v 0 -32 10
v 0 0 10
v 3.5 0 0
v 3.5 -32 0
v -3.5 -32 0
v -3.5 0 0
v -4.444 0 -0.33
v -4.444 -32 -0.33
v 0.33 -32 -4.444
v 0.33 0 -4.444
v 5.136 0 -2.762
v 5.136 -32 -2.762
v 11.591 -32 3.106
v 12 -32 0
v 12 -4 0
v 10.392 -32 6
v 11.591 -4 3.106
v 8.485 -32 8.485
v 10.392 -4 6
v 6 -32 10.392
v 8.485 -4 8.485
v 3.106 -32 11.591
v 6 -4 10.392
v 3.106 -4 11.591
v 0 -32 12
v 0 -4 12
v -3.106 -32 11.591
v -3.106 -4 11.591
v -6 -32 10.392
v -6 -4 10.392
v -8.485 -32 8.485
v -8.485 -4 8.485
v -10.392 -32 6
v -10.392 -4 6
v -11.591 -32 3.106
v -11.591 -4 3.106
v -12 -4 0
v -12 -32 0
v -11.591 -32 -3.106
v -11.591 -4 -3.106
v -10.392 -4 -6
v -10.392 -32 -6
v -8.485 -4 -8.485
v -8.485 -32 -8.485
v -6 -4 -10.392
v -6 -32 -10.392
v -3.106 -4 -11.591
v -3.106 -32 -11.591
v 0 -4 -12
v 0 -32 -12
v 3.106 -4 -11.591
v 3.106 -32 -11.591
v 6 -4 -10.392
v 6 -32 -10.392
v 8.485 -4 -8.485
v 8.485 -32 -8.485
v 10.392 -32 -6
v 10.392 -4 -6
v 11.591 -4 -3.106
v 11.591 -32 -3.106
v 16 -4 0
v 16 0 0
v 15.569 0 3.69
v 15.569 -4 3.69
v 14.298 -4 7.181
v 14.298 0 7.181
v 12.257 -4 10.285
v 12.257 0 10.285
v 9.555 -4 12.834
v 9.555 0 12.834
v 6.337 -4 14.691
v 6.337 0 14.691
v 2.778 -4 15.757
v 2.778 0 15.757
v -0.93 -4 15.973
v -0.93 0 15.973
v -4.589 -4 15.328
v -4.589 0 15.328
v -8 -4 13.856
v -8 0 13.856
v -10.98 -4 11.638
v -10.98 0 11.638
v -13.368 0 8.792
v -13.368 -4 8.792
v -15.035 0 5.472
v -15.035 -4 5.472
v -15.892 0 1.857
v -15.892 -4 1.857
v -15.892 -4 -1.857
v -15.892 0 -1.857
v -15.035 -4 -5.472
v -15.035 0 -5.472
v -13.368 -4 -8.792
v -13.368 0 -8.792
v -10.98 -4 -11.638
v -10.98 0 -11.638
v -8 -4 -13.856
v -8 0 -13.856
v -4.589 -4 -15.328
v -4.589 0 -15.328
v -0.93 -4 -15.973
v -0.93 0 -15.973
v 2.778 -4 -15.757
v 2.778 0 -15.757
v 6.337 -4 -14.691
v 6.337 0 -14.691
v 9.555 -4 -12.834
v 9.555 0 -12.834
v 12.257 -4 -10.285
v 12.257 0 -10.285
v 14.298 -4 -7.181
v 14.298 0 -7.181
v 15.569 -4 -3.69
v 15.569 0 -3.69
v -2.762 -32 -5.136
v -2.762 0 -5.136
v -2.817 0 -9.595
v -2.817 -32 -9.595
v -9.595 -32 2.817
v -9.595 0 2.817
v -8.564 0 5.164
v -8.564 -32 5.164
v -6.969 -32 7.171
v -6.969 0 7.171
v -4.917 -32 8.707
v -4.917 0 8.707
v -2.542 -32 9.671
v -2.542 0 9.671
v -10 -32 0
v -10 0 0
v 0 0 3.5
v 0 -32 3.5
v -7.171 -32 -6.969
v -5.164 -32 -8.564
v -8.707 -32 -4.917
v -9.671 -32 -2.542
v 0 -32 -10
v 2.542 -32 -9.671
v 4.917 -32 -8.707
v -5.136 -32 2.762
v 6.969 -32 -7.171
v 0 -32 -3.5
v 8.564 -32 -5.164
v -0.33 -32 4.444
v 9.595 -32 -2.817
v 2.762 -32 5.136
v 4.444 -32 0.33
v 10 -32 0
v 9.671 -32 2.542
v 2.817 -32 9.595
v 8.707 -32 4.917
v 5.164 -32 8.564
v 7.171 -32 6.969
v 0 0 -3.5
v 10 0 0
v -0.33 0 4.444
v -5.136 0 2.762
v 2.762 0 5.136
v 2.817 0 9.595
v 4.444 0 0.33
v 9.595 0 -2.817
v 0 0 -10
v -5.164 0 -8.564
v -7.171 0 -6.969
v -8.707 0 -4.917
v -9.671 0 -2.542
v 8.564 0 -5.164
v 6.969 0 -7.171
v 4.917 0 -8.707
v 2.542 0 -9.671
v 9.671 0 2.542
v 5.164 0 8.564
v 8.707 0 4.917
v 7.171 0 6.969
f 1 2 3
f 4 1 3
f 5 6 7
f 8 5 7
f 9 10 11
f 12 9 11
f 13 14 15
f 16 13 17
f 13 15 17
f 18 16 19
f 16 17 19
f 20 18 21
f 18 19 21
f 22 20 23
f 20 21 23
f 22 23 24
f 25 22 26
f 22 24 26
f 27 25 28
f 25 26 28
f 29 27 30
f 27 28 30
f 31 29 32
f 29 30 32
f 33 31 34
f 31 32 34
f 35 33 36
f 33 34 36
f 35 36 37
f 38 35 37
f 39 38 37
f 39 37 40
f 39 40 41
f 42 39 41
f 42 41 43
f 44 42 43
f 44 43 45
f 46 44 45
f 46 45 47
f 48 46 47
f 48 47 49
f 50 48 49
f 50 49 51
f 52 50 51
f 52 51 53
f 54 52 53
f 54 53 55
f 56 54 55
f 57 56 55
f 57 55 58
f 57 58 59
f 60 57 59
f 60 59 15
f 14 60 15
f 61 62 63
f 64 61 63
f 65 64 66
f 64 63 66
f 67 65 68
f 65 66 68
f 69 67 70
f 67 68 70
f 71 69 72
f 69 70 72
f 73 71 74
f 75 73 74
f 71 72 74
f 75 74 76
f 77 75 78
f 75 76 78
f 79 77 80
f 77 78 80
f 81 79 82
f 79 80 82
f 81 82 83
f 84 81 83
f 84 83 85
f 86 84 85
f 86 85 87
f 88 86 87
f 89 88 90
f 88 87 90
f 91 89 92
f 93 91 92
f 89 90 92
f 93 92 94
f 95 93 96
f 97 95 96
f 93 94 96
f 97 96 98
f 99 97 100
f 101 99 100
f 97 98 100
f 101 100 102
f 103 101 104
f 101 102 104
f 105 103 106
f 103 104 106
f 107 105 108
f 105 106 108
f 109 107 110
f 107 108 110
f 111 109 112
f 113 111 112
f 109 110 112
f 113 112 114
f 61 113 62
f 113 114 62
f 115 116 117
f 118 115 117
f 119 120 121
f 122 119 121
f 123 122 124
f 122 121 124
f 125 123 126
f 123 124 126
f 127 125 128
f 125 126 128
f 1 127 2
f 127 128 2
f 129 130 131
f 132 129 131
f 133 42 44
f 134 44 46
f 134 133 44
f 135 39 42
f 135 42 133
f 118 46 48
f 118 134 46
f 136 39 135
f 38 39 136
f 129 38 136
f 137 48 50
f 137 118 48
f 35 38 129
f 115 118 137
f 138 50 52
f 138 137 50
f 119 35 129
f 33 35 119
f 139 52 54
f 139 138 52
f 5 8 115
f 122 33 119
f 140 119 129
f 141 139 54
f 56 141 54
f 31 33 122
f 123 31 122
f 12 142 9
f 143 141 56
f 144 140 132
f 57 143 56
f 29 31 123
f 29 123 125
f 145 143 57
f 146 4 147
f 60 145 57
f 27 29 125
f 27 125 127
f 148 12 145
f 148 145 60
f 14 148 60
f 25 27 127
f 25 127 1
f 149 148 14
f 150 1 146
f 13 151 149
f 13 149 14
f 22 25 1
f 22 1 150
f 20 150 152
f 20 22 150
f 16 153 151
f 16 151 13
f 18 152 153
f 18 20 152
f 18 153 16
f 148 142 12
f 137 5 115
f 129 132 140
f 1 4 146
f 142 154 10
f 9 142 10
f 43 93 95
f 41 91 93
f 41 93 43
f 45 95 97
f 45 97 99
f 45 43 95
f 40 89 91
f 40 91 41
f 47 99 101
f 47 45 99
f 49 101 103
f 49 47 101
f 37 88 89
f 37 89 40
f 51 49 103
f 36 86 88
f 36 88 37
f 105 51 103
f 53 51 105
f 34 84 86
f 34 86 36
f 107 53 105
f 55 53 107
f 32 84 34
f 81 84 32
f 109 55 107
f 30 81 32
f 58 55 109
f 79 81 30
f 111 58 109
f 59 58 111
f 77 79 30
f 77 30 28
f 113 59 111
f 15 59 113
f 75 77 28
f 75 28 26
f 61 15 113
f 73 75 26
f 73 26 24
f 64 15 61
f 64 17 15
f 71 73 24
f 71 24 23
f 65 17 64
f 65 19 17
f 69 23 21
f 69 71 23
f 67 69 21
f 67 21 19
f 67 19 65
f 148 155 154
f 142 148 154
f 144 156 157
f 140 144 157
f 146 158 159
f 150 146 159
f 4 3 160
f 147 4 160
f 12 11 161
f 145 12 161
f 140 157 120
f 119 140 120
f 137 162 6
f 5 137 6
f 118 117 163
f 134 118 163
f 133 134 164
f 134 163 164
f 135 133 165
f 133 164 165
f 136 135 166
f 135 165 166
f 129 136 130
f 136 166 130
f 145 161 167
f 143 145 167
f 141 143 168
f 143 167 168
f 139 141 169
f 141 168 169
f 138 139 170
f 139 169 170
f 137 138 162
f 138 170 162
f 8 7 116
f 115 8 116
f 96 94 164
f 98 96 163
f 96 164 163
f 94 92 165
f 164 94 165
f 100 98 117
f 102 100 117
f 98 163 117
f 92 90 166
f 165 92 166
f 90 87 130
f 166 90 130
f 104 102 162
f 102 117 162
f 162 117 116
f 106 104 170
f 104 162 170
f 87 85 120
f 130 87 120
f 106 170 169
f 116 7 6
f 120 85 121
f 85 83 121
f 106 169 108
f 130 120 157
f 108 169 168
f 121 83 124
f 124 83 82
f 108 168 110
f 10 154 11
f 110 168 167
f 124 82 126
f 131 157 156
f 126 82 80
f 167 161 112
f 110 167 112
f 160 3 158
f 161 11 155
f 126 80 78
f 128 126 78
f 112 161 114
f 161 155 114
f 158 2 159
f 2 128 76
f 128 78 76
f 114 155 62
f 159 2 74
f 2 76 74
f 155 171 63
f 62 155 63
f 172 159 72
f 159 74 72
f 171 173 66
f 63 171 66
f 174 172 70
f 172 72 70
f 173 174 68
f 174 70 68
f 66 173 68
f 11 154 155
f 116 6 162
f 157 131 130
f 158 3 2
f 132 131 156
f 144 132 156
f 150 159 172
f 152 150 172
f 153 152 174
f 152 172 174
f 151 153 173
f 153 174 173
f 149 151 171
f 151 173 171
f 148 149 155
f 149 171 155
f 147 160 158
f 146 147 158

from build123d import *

# Parameters (mm, degrees)
F0_R     = 16
F0_R_2   = 12
F1_DEPTH = 4
F2_DEPTH = 32


with BuildPart() as f1:
    # F0 (on Front) → F1 (new body)
    with BuildSketch(Plane.XZ):
        Circle(F0_R)
        Circle(F0_R_2, mode=Mode.SUBTRACT)
        Circle(F0_R_2)
        with BuildLine():
            ThreePointArc((2.81716, 9.594978), (8.005361, 5.992846), (10, 0))
            ThreePointArc((10, 0), (9.985368, -0.540767), (9.941514, -1.079951))
            ThreePointArc((9.941514, -1.079951), (9.806789, -1.956244), (9.594978, -2.81716))
            ThreePointArc((9.594978, -2.81716), (5.992846, -8.005361), (0, -10))
            ThreePointArc((0, -10), (-0.540767, -9.985368), (-1.079951, -9.941514))
            ThreePointArc((-1.079951, -9.941514), (-1.956244, -9.806789), (-2.81716, -9.594978))
            ThreePointArc((-2.81716, -9.594978), (-8.005361, -5.992846), (-10, 0))
            ThreePointArc((-10, 0), (-9.985368, 0.540767), (-9.941514, 1.079951))
            ThreePointArc((-9.941514, 1.079951), (-9.806789, 1.956244), (-9.594978, 2.81716))
            ThreePointArc((-9.594978, 2.81716), (-5.992846, 8.005361), (0, 10))
            ThreePointArc((0, 10), (0.540767, 9.985368), (1.079951, 9.941514))
            ThreePointArc((1.079951, 9.941514), (1.956244, 9.806789), (2.81716, 9.594978))
        make_face(mode=Mode.SUBTRACT)
    extrude(amount=F1_DEPTH)

    # F0 (on Front) → F2 (join)
    with BuildSketch(Plane.XZ):
        Circle(F0_R_2)
        with BuildLine():
            ThreePointArc((2.81716, 9.594978), (8.005361, 5.992846), (10, 0))
            ThreePointArc((10, 0), (9.985368, -0.540767), (9.941514, -1.079951))
            ThreePointArc((9.941514, -1.079951), (9.806789, -1.956244), (9.594978, -2.81716))
            ThreePointArc((9.594978, -2.81716), (5.992846, -8.005361), (0, -10))
            ThreePointArc((0, -10), (-0.540767, -9.985368), (-1.079951, -9.941514))
            ThreePointArc((-1.079951, -9.941514), (-1.956244, -9.806789), (-2.81716, -9.594978))
            ThreePointArc((-2.81716, -9.594978), (-8.005361, -5.992846), (-10, 0))
            ThreePointArc((-10, 0), (-9.985368, 0.540767), (-9.941514, 1.079951))
            ThreePointArc((-9.941514, 1.079951), (-9.806789, 1.956244), (-9.594978, 2.81716))
            ThreePointArc((-9.594978, 2.81716), (-5.992846, 8.005361), (0, 10))
            ThreePointArc((0, 10), (0.540767, 9.985368), (1.079951, 9.941514))
            ThreePointArc((1.079951, 9.941514), (1.956244, 9.806789), (2.81716, 9.594978))
        make_face(mode=Mode.SUBTRACT)
        with BuildLine():
            ThreePointArc((-1.079951, -9.941514), (-0.540767, -9.985368), (0, -10))
            Line((0, -10), (-3.5, 0))
            Line((-3.5, 0), (-4.443858, -0.33035))
            Line((-4.443858, -0.33035), (-2.761905, -5.135932))
            Line((-2.761905, -5.135932), (-1.079951, -9.941514))
        make_face()
        with BuildLine():
            ThreePointArc((-2.81716, -9.594978), (-1.956244, -9.806789), (-1.079951, -9.941514))
            Line((-1.079951, -9.941514), (-2.761905, -5.135932))
            Line((-2.761905, -5.135932), (-2.81716, -9.594978))
        make_face()
        with BuildLine():
            ThreePointArc((9.941514, -1.079951), (9.985368, -0.540767), (10, 0))
            Line((10, 0), (0, -3.5))
            Line((0, -3.5), (0.33035, -4.443858))
            Line((0.33035, -4.443858), (5.135932, -2.761905))
            Line((5.135932, -2.761905), (9.941514, -1.079951))
        make_face()
        with BuildLine():
            ThreePointArc((9.594978, -2.81716), (9.806789, -1.956244), (9.941514, -1.079951))
            Line((9.941514, -1.079951), (5.135932, -2.761905))
            Line((5.135932, -2.761905), (9.594978, -2.81716))
        make_face()
        with BuildLine():
            Line((2.761905, 5.135932), (1.079951, 9.941514))
            ThreePointArc((1.079951, 9.941514), (0.540767, 9.985368), (0, 10))
            Line((0, 10), (3.5, 0))
            Line((3.5, 0), (4.443858, 0.33035))
            Line((4.443858, 0.33035), (2.761905, 5.135932))
        make_face()
        with BuildLine():
            Line((2.761905, 5.135932), (2.81716, 9.594978))
            ThreePointArc((2.81716, 9.594978), (1.956244, 9.806789), (1.079951, 9.941514))
            Line((1.079951, 9.941514), (2.761905, 5.135932))
        make_face()
        with BuildLine():
            Line((-5.135932, 2.761905), (-9.594978, 2.81716))
            ThreePointArc((-9.594978, 2.81716), (-9.806789, 1.956244), (-9.941514, 1.079951))
            Line((-9.941514, 1.079951), (-5.135932, 2.761905))
        make_face()
        with BuildLine():
            Line((-5.135932, 2.761905), (-9.941514, 1.079951))
            ThreePointArc((-9.941514, 1.079951), (-9.985368, 0.540767), (-10, 0))
            Line((-10, 0), (0, 3.5))
            Line((0, 3.5), (-0.33035, 4.443858))
            Line((-0.33035, 4.443858), (-5.135932, 2.761905))
        make_face()
    extrude(amount=F2_DEPTH)


solid = f1.part
